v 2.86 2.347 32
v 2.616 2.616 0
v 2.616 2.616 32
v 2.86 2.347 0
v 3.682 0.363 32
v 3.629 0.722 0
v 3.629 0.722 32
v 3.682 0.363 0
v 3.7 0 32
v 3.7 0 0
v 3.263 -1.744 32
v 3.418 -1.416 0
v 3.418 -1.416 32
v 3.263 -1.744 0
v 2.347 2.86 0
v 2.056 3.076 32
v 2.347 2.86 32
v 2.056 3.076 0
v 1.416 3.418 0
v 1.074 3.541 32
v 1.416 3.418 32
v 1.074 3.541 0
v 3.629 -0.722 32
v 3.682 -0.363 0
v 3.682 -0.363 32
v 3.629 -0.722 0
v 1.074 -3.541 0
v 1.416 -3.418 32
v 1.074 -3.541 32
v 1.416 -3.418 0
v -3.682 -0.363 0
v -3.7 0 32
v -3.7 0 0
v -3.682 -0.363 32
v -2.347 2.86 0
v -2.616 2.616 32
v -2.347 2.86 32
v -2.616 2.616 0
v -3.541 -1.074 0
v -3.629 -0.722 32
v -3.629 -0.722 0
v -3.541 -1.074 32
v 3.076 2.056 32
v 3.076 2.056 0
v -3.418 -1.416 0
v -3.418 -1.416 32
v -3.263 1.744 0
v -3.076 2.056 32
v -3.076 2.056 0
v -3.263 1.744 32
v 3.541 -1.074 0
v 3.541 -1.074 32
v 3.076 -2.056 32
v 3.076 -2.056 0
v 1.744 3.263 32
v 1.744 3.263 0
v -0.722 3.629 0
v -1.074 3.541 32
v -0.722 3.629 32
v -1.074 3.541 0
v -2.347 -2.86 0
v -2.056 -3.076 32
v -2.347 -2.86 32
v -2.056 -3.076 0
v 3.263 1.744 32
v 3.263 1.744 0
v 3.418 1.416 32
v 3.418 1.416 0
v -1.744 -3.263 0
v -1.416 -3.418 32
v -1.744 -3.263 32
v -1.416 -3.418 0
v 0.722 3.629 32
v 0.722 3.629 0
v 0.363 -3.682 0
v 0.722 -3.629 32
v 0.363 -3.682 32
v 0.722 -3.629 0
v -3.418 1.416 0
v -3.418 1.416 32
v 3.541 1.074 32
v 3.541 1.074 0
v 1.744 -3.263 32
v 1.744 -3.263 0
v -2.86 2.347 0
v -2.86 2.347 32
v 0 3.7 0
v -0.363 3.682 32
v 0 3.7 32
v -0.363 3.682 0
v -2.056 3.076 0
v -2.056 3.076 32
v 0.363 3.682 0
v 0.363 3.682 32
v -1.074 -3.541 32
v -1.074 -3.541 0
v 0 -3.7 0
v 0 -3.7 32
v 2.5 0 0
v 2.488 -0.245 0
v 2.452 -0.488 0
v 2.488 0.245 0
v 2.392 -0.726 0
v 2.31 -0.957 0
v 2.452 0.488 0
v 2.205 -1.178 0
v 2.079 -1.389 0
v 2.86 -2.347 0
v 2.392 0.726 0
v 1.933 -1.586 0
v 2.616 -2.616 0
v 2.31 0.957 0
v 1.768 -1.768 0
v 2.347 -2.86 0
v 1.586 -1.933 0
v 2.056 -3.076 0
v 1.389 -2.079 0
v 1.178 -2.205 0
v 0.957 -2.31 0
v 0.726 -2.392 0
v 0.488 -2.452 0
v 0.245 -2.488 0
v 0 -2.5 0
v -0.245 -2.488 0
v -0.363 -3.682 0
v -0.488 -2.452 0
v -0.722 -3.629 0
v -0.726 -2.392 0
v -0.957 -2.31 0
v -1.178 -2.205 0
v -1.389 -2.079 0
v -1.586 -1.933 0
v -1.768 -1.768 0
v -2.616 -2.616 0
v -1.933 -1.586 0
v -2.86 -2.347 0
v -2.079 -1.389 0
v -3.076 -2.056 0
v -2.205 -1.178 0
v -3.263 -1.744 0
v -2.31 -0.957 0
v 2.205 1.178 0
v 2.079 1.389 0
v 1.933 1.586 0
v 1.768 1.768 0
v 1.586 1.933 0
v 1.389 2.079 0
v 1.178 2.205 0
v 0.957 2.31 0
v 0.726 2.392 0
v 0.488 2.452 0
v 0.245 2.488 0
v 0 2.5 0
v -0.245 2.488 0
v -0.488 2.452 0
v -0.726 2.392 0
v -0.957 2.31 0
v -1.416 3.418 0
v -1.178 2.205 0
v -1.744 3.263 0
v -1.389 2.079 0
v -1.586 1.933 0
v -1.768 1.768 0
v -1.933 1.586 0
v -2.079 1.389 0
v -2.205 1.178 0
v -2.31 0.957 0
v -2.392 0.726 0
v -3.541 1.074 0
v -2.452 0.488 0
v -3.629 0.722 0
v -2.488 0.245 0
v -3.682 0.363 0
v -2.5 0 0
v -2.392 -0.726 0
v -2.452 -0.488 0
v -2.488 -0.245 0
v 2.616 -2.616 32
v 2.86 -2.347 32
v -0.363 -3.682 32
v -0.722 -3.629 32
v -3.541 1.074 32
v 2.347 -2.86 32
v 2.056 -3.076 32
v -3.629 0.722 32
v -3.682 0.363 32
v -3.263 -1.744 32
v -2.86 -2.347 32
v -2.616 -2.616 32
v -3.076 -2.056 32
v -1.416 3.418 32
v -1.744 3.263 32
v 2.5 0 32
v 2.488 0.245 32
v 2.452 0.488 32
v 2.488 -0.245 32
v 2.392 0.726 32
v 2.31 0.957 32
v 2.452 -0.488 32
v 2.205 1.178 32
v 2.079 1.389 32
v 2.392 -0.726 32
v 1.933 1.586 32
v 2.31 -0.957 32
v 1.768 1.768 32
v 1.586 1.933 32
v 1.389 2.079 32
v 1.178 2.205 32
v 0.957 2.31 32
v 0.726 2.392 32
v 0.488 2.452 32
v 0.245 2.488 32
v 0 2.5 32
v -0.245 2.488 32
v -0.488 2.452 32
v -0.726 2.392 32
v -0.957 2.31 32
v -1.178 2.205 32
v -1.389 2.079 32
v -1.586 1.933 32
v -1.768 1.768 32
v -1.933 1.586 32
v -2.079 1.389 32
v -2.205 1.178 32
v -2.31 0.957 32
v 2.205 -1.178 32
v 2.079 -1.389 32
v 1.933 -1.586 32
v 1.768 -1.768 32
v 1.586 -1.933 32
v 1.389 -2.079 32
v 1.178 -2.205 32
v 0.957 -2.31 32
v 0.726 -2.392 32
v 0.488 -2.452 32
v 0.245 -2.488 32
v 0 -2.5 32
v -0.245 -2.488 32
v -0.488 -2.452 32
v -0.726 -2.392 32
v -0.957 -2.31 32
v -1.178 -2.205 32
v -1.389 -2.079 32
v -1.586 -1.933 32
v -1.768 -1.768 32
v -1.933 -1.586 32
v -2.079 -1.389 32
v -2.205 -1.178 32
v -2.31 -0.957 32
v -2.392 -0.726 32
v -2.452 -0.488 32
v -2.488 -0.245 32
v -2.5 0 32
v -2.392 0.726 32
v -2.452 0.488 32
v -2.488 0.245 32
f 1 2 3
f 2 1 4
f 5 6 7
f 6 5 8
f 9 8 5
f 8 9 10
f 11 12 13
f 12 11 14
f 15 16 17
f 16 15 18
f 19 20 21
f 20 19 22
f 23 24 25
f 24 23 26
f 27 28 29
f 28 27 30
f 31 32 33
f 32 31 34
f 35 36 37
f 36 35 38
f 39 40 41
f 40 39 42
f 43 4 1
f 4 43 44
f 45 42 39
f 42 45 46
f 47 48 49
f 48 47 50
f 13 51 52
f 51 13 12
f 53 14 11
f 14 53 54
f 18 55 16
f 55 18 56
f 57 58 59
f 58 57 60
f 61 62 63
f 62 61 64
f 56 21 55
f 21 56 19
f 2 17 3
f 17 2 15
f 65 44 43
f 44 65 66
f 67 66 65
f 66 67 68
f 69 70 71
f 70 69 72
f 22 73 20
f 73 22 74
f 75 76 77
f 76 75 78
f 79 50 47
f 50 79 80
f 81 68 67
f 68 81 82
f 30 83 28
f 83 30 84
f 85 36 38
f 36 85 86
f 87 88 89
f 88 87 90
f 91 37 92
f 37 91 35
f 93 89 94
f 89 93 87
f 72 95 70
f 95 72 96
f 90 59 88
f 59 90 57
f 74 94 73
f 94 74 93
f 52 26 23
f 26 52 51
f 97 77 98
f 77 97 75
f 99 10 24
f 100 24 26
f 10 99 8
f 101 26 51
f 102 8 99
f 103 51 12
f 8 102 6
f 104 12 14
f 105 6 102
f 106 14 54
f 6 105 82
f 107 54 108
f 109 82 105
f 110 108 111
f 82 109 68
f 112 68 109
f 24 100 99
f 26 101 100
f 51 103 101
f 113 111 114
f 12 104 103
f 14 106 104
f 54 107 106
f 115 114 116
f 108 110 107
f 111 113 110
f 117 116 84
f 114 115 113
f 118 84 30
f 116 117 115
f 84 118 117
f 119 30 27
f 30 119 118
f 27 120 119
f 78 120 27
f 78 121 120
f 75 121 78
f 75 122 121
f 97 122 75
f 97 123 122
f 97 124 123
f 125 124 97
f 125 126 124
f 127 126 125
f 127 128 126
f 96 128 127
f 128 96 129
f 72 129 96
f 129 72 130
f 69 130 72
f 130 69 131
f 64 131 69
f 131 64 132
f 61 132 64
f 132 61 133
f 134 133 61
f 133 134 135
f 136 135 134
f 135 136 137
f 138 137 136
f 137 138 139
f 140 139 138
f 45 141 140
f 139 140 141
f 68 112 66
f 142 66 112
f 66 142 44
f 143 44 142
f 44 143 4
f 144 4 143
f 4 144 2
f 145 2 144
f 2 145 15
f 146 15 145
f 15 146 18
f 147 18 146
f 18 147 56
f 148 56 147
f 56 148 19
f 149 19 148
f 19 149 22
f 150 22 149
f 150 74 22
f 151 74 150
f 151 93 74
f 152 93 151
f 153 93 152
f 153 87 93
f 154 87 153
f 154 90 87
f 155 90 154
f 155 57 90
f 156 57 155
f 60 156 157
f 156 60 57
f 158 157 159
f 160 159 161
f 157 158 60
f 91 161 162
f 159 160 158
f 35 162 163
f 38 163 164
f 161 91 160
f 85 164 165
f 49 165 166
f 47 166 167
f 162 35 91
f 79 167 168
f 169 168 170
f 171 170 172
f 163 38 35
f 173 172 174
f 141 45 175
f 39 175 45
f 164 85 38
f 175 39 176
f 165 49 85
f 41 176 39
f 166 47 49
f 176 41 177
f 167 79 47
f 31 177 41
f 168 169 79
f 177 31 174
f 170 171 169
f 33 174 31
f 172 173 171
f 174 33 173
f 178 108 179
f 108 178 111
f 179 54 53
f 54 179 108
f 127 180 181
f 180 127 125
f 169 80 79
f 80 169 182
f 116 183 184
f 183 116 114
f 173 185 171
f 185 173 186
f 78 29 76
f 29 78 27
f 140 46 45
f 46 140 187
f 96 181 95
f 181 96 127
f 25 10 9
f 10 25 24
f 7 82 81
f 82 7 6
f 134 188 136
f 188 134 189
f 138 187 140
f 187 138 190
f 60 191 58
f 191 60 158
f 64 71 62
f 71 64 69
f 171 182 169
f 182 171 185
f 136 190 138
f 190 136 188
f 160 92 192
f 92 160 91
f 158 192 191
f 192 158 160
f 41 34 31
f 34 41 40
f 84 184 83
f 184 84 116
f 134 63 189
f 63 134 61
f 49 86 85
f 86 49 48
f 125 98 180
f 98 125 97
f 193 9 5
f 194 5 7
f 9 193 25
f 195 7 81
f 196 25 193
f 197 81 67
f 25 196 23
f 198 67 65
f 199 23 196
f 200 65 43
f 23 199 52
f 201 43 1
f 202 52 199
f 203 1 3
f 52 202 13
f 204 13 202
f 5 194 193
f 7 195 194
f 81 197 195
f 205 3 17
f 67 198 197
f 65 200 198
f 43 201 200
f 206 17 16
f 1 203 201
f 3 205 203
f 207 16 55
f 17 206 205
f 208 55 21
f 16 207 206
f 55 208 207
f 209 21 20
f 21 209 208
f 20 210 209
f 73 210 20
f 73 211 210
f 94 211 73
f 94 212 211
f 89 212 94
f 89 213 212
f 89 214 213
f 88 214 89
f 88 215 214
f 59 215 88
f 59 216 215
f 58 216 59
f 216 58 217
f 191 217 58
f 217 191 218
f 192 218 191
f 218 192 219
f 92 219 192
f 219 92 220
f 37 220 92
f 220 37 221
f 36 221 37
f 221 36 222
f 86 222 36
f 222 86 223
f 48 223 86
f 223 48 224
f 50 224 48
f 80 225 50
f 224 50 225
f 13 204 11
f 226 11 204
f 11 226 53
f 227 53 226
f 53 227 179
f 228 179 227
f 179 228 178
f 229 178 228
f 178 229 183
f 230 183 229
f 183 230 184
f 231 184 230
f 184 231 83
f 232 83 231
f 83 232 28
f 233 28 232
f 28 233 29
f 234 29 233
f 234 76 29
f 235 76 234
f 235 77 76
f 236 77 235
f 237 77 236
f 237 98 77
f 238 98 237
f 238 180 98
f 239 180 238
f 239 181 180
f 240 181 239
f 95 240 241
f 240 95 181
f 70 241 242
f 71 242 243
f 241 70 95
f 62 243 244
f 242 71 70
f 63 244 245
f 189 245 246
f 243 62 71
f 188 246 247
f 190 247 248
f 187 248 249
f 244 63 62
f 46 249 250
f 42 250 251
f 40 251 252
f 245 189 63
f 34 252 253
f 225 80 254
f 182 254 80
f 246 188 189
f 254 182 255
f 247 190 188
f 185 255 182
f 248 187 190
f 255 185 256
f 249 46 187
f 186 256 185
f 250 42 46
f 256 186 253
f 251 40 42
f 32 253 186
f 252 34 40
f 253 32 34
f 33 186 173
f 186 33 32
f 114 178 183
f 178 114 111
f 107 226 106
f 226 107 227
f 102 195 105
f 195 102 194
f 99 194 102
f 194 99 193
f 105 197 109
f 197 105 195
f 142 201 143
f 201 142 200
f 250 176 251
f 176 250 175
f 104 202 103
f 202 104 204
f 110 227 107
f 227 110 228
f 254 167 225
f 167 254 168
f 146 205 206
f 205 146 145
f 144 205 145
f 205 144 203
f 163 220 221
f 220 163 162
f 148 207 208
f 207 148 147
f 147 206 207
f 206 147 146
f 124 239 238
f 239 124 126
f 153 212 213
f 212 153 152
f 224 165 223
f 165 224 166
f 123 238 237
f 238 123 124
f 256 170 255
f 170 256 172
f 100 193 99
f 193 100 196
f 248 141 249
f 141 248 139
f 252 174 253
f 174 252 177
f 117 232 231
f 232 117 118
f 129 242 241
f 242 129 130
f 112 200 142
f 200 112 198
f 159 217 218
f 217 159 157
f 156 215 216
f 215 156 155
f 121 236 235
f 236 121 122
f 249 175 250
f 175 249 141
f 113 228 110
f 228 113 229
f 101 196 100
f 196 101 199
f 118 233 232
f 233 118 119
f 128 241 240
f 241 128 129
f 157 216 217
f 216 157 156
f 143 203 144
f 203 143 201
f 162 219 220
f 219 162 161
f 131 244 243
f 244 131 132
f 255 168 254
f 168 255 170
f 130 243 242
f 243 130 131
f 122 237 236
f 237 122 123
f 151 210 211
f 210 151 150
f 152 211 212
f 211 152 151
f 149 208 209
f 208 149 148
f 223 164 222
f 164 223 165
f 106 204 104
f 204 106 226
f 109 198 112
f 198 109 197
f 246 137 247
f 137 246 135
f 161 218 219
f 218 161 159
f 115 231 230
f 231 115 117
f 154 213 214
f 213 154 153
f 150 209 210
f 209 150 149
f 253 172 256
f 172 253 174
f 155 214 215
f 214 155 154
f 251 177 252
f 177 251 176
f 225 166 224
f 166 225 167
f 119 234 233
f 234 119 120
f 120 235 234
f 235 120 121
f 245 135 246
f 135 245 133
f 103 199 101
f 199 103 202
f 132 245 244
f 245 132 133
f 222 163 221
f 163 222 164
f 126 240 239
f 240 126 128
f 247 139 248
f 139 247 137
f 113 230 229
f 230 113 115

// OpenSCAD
// Durchmesser (mm)
d =  5 ;
// Höhe (mm)
h = 32 ;
// Stärke (mm)
w =  1.2 ;

/* [Hidden] */
$fn = 64 ;


difference()
{
    cylinder(d=d+2*w, h) ;
    cylinder(d=d    , h) ;
}
